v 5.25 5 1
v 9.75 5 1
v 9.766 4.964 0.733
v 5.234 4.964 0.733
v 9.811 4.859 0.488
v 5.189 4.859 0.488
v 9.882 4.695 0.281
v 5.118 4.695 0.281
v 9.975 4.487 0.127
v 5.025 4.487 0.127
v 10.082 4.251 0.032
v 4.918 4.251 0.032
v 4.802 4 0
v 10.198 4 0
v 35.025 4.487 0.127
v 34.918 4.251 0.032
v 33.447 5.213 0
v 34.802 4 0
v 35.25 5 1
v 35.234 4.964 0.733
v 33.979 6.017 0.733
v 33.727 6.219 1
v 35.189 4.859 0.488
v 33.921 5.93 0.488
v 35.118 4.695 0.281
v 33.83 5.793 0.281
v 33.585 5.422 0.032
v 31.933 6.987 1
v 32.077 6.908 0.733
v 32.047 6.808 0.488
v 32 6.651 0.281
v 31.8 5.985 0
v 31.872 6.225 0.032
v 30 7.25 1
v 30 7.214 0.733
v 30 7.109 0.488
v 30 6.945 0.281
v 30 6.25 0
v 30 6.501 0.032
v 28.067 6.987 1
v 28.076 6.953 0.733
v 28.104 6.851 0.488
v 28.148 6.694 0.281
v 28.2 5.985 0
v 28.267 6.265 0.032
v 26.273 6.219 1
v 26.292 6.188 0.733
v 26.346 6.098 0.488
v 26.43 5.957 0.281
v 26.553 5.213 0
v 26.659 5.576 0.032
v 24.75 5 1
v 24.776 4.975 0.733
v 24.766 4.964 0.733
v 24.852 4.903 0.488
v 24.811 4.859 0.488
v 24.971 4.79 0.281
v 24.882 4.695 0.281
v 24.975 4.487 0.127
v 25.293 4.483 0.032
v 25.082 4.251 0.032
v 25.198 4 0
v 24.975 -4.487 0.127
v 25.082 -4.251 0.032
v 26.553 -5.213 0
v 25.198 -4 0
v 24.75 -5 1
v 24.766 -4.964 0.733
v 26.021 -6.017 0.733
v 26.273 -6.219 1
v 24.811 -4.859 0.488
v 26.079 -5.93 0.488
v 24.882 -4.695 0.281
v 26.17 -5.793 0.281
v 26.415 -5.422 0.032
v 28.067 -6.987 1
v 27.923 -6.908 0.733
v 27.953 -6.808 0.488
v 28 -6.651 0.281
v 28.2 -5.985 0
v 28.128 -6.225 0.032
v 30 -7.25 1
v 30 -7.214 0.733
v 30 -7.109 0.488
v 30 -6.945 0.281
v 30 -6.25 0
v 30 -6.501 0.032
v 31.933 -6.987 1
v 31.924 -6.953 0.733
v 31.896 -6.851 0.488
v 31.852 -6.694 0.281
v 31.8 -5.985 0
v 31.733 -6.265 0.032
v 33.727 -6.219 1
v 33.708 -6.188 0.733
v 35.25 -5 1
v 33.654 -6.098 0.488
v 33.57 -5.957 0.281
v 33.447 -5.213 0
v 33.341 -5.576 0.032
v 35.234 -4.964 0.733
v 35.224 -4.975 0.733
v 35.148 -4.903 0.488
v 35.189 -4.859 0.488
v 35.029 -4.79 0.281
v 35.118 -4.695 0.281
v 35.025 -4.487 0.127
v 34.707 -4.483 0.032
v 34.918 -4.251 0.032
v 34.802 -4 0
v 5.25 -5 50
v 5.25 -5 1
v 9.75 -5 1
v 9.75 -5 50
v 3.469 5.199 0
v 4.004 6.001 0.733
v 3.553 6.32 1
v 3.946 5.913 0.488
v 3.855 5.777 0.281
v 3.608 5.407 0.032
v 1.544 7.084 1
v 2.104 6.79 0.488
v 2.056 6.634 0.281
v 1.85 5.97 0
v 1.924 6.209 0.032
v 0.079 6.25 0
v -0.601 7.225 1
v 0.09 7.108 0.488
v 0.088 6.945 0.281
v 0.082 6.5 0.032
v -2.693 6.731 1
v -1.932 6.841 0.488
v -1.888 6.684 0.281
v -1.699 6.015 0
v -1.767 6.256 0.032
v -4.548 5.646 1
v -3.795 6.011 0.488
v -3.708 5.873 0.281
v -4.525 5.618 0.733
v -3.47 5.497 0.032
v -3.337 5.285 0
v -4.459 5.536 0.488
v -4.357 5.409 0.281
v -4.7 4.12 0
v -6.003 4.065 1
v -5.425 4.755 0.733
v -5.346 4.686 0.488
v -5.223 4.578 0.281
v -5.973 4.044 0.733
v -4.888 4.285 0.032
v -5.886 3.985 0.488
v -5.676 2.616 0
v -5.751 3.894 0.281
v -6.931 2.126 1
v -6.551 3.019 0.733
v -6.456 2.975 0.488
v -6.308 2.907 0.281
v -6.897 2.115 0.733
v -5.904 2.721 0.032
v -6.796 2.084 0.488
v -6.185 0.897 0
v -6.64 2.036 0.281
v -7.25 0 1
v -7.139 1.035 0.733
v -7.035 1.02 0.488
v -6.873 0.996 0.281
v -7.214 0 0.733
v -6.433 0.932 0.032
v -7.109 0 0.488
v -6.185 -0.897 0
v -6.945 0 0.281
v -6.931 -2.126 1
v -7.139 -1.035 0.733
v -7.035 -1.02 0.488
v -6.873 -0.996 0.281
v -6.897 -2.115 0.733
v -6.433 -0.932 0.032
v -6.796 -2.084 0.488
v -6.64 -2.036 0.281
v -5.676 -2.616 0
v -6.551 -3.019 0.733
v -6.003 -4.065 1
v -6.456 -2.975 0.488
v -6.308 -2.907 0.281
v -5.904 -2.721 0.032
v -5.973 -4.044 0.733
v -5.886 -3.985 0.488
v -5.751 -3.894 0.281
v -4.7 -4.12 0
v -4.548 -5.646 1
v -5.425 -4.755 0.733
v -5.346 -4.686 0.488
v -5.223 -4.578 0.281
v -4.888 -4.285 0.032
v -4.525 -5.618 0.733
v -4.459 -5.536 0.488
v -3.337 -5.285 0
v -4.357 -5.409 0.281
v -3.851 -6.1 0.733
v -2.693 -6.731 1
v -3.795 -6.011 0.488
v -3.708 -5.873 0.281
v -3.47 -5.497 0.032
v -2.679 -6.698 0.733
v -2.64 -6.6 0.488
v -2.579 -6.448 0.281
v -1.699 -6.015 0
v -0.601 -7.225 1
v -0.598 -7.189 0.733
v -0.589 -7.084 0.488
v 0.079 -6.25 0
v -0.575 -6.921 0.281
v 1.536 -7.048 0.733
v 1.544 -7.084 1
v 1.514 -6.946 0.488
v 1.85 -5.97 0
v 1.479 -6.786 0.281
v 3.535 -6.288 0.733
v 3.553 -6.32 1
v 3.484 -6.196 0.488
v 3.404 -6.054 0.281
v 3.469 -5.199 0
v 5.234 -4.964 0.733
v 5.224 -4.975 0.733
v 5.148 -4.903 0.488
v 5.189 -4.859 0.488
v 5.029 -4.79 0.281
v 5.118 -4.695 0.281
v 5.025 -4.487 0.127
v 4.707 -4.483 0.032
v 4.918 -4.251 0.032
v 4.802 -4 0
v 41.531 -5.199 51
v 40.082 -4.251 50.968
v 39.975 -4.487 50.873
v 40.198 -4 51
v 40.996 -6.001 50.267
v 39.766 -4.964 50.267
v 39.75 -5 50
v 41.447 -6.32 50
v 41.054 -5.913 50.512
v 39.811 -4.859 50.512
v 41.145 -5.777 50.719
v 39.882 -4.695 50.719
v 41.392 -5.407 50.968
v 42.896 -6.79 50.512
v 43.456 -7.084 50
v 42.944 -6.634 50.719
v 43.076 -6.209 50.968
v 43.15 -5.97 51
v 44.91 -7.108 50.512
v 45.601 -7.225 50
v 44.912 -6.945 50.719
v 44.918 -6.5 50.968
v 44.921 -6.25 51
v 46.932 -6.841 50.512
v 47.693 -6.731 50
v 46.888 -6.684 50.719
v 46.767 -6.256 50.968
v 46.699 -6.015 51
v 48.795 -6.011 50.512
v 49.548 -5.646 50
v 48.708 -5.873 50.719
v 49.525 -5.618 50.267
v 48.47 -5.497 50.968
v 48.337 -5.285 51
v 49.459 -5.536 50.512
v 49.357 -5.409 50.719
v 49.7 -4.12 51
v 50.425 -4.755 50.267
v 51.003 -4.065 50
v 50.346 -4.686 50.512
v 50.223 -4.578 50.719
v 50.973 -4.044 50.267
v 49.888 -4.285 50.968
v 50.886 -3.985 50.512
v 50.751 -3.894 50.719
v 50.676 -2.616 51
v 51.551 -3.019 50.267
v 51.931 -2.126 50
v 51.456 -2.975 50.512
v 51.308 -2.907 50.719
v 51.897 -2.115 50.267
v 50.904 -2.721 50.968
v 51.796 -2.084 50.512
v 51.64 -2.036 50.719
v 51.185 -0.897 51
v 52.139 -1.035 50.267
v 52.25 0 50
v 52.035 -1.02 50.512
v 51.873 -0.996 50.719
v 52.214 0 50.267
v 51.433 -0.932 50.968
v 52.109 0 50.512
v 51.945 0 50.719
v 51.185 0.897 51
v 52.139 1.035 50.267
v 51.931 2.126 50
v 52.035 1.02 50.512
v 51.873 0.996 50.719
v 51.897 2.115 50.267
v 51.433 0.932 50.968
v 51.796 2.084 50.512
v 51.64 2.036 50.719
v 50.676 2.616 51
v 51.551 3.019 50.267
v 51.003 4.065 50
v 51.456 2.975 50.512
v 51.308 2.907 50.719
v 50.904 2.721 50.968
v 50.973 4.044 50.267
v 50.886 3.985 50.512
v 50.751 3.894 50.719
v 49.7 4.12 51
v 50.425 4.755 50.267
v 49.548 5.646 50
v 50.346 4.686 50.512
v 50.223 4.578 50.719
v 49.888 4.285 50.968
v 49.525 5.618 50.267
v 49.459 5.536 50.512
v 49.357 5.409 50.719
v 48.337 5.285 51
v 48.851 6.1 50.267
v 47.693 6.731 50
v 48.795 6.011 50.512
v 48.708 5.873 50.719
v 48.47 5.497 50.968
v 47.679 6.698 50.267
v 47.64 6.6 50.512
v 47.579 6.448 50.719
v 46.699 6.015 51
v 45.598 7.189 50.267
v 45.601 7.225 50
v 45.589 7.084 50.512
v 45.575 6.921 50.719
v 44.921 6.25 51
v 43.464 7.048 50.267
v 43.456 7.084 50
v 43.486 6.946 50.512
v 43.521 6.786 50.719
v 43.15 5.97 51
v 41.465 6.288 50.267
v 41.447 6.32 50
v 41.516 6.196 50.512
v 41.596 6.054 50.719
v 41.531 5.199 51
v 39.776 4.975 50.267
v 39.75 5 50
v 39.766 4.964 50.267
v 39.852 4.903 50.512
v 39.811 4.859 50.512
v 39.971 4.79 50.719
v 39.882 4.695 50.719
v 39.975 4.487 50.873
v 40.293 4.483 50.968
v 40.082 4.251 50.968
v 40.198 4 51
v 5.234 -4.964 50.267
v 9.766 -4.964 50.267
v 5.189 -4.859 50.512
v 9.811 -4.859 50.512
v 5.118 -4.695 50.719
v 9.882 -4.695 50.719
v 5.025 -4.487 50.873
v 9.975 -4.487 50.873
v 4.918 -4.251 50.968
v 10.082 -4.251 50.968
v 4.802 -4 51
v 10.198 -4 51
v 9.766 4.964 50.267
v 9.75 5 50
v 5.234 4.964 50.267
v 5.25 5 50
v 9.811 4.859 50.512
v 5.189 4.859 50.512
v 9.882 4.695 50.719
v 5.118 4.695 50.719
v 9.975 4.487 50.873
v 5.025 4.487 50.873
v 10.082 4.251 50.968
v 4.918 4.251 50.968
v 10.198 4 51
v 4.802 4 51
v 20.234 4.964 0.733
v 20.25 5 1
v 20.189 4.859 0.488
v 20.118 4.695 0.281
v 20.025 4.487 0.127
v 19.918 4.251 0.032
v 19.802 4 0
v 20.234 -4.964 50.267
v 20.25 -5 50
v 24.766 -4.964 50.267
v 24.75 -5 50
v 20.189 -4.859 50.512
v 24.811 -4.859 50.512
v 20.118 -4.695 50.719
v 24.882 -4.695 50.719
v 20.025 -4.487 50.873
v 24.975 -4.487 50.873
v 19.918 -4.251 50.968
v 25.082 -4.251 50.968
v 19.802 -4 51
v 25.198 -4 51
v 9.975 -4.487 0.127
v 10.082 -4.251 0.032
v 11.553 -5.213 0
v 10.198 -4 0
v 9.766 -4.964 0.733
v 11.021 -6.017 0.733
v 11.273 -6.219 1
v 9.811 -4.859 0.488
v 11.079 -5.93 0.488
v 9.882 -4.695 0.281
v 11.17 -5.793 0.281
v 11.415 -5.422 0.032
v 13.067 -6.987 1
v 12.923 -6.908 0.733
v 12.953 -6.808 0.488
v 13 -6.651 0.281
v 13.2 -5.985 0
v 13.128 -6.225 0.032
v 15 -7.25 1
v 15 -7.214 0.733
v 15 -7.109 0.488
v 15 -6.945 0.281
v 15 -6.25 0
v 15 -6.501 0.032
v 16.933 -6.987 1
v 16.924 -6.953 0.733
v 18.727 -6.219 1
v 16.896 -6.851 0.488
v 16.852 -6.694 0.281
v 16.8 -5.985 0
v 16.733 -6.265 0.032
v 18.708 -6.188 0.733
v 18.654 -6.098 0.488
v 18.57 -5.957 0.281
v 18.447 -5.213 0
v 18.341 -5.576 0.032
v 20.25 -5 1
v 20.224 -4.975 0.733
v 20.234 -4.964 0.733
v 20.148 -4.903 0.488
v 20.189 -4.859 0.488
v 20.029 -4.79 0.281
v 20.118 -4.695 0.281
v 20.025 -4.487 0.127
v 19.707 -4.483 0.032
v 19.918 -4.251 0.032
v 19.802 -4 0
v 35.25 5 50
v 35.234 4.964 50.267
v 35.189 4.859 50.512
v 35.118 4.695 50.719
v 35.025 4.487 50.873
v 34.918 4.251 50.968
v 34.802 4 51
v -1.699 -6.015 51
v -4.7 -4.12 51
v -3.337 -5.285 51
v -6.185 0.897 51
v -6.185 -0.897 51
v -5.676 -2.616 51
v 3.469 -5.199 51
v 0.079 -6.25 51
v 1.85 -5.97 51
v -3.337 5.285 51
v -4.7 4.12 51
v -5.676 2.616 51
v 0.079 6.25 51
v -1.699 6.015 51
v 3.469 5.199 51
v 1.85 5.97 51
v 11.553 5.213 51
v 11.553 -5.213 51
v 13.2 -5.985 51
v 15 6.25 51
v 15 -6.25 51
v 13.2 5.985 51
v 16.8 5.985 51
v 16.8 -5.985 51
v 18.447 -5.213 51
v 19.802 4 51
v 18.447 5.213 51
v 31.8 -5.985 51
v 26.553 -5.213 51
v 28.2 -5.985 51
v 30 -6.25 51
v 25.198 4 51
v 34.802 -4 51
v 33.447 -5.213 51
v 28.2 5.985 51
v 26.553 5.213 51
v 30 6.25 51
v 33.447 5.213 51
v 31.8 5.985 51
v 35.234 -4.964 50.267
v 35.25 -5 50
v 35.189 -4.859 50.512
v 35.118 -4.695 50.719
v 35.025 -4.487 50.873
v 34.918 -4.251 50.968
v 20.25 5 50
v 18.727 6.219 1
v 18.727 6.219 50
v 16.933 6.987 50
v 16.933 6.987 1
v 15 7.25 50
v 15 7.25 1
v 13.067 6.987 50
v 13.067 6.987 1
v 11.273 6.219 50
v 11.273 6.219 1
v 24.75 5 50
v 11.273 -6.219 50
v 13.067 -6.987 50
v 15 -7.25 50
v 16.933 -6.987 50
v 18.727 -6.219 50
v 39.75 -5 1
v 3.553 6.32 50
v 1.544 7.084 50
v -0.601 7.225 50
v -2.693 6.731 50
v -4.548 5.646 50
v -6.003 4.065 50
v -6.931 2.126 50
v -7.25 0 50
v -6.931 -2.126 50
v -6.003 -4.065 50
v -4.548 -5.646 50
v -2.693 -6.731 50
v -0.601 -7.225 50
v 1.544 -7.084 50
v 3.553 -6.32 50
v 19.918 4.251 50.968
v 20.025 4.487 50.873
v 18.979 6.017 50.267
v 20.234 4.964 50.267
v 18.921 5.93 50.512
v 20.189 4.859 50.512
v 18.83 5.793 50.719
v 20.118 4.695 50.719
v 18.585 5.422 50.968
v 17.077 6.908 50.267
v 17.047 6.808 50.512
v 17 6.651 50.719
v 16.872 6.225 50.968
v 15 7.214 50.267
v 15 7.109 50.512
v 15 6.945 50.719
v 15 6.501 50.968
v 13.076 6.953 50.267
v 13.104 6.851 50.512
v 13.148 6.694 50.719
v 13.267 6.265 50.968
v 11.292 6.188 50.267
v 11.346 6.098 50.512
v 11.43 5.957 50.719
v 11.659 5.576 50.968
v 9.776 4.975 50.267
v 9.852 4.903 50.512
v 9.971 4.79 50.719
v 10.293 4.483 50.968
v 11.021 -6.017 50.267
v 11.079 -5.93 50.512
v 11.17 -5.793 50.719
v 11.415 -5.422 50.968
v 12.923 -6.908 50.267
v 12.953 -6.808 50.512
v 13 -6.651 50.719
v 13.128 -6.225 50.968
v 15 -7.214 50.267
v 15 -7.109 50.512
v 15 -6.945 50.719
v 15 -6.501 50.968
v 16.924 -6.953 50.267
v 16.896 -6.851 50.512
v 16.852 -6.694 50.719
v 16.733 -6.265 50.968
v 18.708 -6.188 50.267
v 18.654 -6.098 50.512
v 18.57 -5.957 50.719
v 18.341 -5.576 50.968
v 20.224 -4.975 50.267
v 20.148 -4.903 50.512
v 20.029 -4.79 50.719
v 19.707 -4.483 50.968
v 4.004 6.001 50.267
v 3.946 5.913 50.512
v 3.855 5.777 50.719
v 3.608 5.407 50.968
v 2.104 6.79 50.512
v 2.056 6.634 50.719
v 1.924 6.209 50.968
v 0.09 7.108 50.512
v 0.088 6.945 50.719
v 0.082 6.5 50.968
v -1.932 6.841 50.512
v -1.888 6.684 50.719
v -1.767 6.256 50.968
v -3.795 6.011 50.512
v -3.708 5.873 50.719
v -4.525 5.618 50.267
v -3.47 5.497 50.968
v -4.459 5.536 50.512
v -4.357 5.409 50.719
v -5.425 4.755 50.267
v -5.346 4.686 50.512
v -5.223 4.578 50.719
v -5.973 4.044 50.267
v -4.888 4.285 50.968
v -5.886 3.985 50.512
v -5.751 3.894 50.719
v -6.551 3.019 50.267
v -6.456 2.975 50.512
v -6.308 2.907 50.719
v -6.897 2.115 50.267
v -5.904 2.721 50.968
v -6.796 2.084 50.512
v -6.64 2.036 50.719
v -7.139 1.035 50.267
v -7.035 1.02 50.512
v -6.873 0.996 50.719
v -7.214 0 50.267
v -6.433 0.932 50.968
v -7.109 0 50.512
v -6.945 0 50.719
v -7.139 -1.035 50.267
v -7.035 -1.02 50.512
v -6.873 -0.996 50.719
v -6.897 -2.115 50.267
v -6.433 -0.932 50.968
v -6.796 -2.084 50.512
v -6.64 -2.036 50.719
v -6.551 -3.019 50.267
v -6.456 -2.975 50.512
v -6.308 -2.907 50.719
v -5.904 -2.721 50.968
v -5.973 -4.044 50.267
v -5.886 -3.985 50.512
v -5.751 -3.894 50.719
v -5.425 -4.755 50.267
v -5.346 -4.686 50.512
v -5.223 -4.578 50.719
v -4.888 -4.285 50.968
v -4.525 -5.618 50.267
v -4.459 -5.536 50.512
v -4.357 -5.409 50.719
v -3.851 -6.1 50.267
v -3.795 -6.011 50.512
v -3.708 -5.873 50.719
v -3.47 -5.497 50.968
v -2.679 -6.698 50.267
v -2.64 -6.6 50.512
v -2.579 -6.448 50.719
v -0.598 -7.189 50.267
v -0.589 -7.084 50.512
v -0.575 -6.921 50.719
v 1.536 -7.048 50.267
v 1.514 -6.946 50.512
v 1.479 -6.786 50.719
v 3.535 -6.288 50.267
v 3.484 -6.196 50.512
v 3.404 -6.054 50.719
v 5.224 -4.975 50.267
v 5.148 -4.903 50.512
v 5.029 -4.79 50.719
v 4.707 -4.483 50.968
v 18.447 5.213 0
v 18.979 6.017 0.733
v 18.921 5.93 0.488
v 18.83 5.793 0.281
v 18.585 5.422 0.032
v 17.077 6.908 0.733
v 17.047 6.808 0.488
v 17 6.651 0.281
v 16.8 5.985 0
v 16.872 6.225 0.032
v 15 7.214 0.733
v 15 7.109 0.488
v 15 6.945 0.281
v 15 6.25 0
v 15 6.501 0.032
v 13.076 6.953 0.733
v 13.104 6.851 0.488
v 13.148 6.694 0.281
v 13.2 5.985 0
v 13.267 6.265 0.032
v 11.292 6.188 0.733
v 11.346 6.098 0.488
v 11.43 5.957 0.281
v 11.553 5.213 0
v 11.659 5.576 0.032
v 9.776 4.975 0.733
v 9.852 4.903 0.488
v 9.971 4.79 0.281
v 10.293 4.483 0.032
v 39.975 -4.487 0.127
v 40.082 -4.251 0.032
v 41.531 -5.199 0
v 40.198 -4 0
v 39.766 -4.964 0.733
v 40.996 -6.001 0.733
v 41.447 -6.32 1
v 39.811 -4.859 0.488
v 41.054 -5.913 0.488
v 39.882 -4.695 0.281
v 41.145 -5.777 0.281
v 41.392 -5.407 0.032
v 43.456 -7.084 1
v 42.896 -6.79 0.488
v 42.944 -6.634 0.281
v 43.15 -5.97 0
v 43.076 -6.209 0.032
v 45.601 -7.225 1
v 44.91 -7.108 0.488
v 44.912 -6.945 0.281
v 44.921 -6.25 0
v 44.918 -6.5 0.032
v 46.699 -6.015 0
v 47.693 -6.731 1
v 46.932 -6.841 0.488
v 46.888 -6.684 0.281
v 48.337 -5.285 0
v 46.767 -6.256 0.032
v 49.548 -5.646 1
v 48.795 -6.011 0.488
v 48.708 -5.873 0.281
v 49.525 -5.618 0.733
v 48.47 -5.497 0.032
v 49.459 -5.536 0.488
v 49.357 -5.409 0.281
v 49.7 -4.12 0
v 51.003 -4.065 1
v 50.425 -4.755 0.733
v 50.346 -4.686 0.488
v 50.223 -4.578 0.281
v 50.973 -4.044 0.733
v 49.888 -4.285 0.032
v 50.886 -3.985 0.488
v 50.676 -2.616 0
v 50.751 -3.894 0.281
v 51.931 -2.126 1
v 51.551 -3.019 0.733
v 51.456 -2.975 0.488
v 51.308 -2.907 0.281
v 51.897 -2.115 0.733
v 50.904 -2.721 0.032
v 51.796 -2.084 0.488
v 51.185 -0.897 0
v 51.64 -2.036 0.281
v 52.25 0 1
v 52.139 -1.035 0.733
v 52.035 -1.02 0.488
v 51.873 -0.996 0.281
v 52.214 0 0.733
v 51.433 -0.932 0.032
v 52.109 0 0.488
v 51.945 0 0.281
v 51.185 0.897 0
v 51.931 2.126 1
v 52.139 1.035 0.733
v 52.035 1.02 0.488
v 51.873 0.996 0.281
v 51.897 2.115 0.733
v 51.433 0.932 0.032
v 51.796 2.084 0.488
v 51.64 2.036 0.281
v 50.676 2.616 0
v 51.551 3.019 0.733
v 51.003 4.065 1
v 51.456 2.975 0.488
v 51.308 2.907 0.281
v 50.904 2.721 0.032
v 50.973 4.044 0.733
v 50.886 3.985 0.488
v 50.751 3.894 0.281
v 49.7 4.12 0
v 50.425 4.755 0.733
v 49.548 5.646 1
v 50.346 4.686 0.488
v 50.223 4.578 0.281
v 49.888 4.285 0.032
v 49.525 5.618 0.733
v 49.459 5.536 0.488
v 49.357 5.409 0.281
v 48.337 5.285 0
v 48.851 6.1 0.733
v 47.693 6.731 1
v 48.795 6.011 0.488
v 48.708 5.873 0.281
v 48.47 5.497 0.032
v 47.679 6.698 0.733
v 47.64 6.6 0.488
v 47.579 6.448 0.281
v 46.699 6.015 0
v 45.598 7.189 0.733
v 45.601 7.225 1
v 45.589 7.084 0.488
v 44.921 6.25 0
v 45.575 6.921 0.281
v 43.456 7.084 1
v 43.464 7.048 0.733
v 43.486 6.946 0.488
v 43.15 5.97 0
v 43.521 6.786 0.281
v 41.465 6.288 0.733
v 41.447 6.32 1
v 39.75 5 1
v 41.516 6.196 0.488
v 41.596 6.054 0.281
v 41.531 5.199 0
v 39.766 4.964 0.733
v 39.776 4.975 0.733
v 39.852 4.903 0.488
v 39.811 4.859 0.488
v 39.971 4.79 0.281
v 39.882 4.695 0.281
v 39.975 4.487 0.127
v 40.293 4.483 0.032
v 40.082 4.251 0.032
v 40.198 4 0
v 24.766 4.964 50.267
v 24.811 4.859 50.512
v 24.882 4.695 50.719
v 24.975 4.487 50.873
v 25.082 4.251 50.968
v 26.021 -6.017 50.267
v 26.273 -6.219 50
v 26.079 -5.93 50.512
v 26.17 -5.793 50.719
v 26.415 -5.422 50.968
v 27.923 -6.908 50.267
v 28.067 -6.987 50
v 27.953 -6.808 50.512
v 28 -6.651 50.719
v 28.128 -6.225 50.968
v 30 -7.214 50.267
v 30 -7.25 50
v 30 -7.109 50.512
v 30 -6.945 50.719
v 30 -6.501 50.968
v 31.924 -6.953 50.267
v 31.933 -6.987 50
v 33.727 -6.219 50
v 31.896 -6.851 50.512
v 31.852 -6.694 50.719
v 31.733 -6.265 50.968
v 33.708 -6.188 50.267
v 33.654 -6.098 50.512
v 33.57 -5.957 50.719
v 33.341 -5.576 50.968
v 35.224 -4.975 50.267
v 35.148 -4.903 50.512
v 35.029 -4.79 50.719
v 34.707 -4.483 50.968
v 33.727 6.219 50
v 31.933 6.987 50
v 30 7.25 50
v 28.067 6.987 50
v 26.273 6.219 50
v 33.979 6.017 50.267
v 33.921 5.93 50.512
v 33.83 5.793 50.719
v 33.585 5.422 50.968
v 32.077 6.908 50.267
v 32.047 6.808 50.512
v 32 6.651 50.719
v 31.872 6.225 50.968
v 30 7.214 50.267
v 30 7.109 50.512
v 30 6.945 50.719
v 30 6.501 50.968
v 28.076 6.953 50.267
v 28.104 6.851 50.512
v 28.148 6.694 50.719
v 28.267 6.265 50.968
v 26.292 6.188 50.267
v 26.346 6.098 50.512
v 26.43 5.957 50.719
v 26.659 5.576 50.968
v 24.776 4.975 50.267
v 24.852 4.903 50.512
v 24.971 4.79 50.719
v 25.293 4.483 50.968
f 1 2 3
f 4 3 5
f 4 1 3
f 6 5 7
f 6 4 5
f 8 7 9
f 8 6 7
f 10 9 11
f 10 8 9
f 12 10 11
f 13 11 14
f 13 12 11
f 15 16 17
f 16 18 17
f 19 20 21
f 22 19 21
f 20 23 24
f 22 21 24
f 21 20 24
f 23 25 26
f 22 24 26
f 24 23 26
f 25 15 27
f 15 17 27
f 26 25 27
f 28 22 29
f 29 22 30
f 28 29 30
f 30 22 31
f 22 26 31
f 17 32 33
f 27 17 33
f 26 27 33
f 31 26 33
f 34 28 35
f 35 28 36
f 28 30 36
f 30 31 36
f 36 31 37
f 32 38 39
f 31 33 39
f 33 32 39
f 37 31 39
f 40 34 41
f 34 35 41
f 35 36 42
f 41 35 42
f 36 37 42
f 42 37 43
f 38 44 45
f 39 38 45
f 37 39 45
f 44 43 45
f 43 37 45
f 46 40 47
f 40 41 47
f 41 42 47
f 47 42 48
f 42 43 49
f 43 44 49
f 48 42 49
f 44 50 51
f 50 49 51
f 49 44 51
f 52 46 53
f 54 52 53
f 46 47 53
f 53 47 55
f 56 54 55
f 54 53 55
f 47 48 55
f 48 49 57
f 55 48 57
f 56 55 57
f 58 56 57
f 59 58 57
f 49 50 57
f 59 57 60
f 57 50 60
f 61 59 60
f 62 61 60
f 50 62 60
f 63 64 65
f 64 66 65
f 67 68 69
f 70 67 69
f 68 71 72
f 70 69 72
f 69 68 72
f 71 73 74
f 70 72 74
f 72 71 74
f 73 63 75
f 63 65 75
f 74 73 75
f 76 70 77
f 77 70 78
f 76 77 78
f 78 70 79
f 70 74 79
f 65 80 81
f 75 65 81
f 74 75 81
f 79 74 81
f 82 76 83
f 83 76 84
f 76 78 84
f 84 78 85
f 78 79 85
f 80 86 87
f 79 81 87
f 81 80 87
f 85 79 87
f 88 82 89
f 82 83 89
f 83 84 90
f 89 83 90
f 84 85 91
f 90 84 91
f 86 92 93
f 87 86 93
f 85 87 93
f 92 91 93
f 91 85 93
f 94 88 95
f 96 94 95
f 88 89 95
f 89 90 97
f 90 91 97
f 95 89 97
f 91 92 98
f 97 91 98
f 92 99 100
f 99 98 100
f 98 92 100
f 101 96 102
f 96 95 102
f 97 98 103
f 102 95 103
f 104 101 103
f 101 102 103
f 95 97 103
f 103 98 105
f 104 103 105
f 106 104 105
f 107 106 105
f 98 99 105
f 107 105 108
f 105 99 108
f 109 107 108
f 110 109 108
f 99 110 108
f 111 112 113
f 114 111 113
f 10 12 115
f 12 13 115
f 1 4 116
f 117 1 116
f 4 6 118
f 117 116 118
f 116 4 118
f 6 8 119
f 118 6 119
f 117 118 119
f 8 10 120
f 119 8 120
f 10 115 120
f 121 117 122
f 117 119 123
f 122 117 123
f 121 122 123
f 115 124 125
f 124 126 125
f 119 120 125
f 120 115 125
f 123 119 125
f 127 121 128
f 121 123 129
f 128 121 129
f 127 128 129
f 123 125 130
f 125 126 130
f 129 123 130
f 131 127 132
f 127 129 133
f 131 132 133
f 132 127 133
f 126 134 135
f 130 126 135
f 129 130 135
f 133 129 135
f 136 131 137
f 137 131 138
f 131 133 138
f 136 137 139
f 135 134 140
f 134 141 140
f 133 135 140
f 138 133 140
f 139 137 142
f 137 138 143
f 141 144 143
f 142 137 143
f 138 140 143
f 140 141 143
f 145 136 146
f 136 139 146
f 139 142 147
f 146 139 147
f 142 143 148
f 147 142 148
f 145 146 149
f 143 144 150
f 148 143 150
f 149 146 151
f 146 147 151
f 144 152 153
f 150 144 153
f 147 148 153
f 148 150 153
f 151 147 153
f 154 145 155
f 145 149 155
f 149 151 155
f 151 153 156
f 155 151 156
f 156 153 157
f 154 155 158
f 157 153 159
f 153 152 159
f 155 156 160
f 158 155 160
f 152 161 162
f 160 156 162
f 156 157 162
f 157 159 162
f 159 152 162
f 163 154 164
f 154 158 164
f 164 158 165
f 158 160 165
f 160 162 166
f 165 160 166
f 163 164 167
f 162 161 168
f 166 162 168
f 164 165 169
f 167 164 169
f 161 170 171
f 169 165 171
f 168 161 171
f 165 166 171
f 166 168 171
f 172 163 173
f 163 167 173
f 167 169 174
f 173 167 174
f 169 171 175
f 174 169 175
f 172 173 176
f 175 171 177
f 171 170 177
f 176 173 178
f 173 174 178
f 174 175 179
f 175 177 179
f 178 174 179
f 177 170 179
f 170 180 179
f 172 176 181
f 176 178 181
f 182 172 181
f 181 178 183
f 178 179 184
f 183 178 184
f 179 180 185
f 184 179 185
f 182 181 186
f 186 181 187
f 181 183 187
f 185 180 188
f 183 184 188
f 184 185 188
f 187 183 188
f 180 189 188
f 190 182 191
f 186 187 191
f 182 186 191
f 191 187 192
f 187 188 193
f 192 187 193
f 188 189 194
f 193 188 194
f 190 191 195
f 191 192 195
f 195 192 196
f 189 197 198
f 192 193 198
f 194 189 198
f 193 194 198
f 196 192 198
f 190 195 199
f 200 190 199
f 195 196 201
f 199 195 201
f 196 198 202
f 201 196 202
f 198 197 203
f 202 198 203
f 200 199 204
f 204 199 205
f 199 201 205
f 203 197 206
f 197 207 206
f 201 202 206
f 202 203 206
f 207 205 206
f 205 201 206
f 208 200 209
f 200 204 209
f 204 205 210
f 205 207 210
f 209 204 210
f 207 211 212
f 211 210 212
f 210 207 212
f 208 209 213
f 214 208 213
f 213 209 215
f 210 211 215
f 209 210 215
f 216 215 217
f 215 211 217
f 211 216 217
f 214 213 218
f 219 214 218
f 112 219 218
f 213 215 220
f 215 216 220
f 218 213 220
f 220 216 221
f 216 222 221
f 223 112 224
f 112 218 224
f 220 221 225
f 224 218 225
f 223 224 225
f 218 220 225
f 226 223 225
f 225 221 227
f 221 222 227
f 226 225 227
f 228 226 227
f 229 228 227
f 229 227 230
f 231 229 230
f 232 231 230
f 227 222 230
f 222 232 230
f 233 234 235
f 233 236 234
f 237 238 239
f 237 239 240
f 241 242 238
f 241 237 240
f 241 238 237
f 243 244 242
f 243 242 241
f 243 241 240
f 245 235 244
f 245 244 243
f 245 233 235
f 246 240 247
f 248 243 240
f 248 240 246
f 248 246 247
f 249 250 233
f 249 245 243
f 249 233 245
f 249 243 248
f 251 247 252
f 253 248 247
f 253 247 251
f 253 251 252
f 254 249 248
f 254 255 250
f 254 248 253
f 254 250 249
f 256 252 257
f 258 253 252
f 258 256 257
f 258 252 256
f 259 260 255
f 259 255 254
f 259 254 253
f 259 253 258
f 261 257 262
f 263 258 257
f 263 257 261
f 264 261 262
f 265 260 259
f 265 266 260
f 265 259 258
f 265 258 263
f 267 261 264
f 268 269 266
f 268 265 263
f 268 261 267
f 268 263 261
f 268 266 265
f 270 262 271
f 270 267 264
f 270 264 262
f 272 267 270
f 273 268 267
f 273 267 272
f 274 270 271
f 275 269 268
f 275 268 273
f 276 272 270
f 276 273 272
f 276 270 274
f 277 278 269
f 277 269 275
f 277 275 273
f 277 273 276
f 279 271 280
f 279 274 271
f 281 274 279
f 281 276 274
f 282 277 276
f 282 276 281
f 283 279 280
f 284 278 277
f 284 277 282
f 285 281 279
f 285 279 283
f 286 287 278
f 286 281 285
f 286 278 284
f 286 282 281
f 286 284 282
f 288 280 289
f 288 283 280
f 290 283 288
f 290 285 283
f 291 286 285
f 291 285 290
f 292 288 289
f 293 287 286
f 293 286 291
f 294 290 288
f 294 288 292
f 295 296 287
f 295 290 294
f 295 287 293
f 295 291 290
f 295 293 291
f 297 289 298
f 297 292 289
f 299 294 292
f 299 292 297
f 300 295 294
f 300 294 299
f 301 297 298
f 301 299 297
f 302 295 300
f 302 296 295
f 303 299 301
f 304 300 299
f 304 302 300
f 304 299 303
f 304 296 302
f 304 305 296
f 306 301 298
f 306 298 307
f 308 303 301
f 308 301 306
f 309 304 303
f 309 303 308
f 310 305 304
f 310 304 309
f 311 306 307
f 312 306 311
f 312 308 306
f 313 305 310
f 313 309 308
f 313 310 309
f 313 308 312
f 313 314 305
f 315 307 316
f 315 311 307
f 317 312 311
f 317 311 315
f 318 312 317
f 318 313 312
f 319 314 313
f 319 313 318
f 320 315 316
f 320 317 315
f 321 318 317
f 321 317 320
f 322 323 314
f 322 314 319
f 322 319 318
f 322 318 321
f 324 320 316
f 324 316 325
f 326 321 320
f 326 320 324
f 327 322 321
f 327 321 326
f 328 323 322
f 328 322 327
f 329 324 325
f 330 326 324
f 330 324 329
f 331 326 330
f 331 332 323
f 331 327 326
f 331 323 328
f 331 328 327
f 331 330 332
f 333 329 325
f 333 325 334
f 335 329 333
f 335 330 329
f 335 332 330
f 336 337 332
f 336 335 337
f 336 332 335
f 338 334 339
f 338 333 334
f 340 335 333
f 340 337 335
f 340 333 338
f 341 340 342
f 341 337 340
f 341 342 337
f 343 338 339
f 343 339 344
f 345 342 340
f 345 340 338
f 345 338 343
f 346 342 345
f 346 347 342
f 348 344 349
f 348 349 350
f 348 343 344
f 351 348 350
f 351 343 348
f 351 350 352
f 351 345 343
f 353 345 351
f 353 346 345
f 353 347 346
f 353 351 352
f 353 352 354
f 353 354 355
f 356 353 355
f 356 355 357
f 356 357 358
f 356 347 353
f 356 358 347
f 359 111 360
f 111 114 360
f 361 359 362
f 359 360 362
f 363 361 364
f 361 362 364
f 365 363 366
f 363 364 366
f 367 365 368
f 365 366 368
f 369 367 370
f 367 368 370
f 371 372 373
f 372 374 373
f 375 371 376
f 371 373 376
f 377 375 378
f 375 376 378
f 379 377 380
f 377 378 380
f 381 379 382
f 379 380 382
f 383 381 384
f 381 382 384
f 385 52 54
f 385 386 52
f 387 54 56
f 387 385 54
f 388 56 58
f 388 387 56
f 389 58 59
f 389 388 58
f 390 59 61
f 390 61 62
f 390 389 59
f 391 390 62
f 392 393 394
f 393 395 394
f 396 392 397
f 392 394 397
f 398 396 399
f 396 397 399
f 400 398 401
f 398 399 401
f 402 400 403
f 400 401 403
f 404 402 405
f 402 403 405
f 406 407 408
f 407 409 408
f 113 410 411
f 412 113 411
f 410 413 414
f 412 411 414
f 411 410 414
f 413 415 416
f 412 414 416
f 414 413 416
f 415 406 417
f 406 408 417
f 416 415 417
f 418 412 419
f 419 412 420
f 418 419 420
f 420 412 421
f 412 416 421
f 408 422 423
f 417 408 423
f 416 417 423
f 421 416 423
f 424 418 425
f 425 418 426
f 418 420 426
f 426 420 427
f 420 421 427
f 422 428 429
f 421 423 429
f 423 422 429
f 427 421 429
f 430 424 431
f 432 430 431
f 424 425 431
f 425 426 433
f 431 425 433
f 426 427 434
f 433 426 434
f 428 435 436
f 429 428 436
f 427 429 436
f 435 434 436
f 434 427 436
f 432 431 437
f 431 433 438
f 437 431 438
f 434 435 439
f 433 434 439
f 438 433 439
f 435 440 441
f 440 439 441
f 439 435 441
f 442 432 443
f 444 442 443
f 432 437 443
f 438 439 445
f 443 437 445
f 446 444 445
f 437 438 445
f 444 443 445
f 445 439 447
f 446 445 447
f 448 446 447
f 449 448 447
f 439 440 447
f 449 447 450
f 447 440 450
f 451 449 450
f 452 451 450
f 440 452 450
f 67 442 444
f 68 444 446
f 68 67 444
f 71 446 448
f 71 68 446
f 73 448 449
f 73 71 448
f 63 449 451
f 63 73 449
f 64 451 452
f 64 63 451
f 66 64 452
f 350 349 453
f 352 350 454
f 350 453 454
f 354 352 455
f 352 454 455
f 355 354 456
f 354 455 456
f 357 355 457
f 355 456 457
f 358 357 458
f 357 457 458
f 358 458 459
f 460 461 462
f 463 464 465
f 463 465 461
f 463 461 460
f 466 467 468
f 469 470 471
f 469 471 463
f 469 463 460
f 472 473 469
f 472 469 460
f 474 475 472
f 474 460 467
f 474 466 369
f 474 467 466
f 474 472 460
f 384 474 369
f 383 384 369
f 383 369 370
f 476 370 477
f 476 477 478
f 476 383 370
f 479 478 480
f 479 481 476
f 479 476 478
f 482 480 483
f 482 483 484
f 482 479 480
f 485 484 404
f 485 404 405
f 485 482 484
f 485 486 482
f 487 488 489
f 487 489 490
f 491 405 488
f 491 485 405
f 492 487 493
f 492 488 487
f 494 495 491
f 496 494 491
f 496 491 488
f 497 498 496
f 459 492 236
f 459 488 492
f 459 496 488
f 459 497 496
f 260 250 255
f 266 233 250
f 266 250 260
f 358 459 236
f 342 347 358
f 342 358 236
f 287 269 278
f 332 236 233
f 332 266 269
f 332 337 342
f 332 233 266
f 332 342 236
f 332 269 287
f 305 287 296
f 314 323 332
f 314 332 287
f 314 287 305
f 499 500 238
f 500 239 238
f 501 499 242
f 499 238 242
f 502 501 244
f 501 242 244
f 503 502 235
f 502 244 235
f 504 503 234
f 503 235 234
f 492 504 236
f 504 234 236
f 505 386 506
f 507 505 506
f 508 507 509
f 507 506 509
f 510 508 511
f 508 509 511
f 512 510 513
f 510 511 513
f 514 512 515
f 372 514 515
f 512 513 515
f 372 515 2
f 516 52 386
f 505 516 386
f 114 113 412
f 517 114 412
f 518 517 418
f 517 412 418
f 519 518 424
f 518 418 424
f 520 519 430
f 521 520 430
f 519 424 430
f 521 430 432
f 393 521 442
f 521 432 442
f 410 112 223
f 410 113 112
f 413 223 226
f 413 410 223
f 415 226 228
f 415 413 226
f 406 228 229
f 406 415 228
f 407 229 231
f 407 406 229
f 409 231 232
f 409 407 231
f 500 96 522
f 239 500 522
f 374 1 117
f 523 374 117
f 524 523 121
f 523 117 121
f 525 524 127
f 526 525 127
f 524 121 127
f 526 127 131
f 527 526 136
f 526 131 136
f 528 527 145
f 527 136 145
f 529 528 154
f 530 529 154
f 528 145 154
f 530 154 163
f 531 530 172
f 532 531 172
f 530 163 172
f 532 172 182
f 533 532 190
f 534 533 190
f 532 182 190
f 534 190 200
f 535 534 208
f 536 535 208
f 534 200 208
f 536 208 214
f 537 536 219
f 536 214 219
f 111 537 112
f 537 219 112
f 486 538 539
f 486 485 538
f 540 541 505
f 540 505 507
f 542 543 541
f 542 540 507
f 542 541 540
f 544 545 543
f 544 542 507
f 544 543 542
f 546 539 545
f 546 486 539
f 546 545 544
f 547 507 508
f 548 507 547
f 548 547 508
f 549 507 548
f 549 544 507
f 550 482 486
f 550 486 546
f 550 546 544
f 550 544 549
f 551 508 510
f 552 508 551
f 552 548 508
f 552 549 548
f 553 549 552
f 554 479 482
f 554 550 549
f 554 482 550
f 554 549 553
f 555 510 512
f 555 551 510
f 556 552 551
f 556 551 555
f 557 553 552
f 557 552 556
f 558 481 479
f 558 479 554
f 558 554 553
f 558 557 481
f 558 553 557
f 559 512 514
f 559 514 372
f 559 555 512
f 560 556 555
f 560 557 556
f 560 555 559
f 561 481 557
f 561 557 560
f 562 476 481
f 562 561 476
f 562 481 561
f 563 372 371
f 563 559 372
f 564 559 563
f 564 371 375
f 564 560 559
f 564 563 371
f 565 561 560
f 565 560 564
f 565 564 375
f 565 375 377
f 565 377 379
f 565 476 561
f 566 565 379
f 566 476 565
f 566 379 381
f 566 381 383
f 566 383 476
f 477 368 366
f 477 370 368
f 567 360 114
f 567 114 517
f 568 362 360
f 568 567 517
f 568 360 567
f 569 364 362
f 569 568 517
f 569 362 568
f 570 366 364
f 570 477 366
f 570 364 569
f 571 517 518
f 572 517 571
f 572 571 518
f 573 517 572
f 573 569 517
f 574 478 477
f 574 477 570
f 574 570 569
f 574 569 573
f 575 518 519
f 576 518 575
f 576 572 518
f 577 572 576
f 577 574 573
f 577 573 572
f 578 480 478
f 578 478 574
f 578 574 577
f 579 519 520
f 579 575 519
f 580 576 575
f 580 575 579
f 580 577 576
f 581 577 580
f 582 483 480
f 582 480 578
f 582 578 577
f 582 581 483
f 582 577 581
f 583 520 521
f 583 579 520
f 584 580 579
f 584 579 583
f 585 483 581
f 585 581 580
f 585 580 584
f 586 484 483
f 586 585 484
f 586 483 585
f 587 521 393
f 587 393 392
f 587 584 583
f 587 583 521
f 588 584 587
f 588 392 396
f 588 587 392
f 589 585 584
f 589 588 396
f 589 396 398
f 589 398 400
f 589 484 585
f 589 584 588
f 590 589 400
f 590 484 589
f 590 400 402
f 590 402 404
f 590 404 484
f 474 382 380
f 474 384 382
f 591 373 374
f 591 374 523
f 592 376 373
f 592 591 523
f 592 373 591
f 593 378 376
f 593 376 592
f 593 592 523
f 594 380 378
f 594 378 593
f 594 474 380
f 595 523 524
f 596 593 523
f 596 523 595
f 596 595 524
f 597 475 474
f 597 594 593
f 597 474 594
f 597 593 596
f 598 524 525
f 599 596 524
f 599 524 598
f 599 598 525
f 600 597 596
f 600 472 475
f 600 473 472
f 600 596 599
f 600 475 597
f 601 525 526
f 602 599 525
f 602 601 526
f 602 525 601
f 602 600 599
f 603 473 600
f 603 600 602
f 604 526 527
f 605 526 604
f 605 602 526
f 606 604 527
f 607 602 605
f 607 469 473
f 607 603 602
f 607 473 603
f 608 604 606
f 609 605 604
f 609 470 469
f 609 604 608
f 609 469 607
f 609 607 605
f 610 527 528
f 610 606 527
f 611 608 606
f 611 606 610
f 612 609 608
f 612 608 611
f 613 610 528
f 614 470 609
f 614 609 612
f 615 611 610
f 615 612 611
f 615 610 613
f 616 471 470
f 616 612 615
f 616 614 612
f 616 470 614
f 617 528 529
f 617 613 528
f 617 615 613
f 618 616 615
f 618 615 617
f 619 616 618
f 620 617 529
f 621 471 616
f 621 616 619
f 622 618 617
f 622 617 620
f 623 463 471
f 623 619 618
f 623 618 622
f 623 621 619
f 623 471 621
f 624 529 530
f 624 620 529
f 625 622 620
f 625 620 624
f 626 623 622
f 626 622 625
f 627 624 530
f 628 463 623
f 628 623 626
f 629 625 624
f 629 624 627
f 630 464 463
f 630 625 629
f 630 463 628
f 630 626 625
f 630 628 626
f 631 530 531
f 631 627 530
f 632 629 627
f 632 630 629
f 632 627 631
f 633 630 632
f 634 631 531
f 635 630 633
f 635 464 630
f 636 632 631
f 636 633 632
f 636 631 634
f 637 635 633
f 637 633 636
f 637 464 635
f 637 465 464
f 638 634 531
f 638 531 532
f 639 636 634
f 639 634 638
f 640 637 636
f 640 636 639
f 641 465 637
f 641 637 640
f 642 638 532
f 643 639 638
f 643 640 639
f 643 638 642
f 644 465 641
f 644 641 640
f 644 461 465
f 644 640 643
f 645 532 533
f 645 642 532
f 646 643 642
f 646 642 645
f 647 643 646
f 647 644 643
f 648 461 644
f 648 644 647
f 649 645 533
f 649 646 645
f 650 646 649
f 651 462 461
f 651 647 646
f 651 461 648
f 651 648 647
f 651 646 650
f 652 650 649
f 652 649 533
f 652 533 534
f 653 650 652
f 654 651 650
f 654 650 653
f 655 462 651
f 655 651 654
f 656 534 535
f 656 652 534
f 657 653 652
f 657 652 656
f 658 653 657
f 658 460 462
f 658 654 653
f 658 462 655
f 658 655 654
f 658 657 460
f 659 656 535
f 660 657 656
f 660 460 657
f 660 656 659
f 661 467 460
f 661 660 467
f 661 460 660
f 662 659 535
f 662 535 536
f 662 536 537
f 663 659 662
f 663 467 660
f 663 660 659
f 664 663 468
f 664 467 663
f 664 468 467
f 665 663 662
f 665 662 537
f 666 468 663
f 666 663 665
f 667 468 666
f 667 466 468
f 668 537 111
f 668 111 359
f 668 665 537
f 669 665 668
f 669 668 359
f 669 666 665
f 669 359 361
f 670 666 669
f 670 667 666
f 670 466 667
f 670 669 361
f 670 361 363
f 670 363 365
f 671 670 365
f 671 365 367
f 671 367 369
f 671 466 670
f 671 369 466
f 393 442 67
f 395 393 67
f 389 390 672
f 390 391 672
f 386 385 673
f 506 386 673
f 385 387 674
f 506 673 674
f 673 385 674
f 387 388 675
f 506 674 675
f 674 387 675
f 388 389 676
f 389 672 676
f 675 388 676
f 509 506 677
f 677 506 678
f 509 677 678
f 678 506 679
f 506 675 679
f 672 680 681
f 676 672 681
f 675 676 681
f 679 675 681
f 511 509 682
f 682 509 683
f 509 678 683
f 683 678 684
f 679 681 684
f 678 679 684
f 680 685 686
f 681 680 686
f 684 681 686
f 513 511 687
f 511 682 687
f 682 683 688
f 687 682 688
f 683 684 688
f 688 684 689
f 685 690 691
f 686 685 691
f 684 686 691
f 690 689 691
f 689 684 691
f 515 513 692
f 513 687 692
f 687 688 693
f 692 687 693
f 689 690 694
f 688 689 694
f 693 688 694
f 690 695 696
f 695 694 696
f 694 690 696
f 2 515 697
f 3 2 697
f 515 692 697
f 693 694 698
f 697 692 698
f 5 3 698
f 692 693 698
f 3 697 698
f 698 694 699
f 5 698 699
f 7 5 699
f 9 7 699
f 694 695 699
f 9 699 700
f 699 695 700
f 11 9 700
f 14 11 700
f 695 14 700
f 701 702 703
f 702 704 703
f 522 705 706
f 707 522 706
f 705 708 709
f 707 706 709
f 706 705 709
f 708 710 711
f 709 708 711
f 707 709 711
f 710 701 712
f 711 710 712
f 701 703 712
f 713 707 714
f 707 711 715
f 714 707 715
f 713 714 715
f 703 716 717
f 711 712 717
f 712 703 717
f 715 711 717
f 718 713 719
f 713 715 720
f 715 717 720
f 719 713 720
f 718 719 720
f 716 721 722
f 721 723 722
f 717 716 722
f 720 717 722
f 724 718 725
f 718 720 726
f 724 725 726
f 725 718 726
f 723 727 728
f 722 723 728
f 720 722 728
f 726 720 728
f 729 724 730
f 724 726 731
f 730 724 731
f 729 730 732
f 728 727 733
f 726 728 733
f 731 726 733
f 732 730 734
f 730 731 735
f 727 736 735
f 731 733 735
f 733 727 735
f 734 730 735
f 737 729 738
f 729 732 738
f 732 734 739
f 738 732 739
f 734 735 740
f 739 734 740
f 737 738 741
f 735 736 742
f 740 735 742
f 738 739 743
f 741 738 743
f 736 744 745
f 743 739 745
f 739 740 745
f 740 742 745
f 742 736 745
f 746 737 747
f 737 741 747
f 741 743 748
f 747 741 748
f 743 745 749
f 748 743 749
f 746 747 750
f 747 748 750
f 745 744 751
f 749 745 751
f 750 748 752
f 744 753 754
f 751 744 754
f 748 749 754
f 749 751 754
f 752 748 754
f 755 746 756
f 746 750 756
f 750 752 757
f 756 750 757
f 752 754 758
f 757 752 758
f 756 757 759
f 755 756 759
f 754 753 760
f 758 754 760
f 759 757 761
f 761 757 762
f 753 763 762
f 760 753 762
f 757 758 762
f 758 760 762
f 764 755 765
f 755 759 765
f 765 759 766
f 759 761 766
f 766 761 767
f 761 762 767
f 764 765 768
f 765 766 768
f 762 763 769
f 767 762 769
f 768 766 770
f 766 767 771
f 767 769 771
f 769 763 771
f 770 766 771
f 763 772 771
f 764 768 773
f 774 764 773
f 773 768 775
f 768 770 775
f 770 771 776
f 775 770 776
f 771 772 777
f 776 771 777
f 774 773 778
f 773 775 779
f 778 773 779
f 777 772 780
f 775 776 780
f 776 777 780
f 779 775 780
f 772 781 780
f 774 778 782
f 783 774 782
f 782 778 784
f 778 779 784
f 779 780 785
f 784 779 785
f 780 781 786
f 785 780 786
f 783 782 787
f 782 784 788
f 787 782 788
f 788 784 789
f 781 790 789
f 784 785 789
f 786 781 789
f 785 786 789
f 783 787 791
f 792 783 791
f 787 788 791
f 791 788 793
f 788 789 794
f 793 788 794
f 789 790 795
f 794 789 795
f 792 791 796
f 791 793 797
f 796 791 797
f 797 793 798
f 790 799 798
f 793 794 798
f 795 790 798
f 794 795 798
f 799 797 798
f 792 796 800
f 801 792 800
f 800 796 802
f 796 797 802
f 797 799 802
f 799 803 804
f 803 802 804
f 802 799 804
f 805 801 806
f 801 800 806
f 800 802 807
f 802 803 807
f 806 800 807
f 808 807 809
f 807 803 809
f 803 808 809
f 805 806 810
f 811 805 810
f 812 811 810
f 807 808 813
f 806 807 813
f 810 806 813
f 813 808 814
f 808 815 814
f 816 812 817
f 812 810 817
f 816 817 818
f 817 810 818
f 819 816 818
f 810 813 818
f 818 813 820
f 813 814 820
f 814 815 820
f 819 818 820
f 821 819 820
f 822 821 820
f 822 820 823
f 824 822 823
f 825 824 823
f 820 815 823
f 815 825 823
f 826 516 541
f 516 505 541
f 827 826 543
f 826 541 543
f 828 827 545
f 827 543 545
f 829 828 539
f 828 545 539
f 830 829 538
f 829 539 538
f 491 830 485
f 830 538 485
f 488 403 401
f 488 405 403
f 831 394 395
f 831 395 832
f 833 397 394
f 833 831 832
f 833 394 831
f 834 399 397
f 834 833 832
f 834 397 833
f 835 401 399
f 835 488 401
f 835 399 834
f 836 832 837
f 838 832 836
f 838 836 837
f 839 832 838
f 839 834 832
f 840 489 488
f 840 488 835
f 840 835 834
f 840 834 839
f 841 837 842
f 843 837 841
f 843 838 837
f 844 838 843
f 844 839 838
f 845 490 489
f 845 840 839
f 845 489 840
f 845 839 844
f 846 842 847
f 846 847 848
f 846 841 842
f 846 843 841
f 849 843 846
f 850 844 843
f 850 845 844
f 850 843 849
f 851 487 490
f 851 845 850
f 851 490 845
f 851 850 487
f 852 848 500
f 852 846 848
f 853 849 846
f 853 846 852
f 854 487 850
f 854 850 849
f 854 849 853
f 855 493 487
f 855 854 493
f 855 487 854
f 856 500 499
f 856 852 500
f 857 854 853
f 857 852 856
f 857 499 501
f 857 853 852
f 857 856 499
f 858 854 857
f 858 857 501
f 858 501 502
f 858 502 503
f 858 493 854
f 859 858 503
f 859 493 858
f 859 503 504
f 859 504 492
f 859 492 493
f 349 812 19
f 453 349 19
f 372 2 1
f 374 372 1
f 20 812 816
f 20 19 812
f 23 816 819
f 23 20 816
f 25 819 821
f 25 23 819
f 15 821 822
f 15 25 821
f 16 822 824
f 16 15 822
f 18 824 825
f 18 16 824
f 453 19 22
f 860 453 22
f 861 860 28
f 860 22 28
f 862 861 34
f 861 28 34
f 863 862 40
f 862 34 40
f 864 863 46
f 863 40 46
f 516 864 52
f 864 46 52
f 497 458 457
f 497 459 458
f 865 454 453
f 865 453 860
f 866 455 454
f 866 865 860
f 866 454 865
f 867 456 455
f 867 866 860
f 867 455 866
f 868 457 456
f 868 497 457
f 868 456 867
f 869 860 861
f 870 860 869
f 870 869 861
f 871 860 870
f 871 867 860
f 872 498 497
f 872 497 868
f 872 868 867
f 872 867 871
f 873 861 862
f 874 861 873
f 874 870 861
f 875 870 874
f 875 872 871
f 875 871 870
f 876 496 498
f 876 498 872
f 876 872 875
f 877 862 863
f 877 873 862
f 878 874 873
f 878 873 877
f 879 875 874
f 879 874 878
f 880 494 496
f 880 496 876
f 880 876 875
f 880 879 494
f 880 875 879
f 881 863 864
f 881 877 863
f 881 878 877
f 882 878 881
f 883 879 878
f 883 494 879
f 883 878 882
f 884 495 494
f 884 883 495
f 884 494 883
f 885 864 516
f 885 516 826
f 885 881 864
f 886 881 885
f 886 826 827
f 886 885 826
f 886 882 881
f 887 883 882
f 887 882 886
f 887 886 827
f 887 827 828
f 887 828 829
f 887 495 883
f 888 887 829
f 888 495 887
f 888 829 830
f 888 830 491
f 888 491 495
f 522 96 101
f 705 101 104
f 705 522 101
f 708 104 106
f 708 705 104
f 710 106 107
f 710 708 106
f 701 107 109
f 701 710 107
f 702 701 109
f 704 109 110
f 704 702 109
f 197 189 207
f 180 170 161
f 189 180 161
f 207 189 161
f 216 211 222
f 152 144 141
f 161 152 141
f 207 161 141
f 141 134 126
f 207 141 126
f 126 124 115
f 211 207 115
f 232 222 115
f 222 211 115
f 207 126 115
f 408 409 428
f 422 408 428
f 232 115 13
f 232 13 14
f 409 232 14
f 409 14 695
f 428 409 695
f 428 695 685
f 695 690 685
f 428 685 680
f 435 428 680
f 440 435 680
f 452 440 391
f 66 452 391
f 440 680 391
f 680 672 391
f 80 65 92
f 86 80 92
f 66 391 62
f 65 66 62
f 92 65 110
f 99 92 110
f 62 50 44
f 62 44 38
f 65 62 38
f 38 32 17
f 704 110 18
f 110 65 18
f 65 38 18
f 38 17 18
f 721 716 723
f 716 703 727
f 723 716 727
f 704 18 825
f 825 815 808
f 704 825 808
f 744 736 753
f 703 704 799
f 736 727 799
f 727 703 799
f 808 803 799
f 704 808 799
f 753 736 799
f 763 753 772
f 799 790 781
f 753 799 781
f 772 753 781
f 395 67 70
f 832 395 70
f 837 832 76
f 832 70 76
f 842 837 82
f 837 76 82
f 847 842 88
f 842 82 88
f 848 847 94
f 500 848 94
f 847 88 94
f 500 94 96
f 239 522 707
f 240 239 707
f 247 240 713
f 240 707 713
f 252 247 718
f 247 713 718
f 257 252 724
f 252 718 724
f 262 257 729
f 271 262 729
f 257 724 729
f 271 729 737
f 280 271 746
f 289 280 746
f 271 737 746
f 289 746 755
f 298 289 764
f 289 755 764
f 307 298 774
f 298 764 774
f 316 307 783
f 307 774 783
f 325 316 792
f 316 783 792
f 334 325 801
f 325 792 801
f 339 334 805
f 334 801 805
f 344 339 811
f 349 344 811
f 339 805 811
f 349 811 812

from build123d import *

# Parameters (mm, degrees)
BOSS_EXTRUDE1_DEPTH = 51
FILLET1_R           = 1


with BuildPart() as part:
    # Sketch1 → Boss-Extrude1 (new body)
    with BuildSketch(Plane.XY):
        with BuildLine():
            ThreePointArc((5.25, 5), (-7.25, 0), (5.25, -5))
            Line((5.25, -5), (9.75, -5))
            ThreePointArc((9.75, -5), (15, -7.25), (20.25, -5))
            Line((20.25, -5), (24.75, -5))
            ThreePointArc((24.75, -5), (30, -7.25), (35.25, -5))
            Line((35.25, -5), (39.75, -5))
            ThreePointArc((39.75, -5), (52.25, 0), (39.75, 5))
            Line((39.75, 5), (35.25, 5))
            ThreePointArc((35.25, 5), (30, 7.25), (24.75, 5))
            Line((24.75, 5), (20.25, 5))
            ThreePointArc((20.25, 5), (15, 7.25), (9.75, 5))
            Line((9.75, 5), (5.25, 5))
        make_face()
    extrude(amount=BOSS_EXTRUDE1_DEPTH)

    # Fillet1
    fillet1_edges = [part.edges().sort_by_distance(p)[0] for p in [
        (7.5, -5, 0),
        (15, -7.25, 0),
        (22.5, -5, 0),
        (30, -7.25, 0),
        (37.5, -5, 0),
        (52.25, 0, 0),
        (37.5, 5, 0),
        (30, 7.25, 0),
        (22.5, 5, 0),
        (15, 7.25, 0),
        (7.5, 5, 0),
        (-7.25, 0, 0),
        (7.5, 5, 51),
        (15, 7.25, 51),
        (22.5, 5, 51),
        (30, 7.25, 51),
        (37.5, 5, 51),
        (52.25, 0, 51),
        (37.5, -5, 51),
        (30, -7.25, 51),
        (22.5, -5, 51),
        (15, -7.25, 51),
        (7.5, -5, 51),
        (-7.25, 0, 51),
    ]]
    fillet(fillet1_edges, radius=FILLET1_R)


solid = part.part
